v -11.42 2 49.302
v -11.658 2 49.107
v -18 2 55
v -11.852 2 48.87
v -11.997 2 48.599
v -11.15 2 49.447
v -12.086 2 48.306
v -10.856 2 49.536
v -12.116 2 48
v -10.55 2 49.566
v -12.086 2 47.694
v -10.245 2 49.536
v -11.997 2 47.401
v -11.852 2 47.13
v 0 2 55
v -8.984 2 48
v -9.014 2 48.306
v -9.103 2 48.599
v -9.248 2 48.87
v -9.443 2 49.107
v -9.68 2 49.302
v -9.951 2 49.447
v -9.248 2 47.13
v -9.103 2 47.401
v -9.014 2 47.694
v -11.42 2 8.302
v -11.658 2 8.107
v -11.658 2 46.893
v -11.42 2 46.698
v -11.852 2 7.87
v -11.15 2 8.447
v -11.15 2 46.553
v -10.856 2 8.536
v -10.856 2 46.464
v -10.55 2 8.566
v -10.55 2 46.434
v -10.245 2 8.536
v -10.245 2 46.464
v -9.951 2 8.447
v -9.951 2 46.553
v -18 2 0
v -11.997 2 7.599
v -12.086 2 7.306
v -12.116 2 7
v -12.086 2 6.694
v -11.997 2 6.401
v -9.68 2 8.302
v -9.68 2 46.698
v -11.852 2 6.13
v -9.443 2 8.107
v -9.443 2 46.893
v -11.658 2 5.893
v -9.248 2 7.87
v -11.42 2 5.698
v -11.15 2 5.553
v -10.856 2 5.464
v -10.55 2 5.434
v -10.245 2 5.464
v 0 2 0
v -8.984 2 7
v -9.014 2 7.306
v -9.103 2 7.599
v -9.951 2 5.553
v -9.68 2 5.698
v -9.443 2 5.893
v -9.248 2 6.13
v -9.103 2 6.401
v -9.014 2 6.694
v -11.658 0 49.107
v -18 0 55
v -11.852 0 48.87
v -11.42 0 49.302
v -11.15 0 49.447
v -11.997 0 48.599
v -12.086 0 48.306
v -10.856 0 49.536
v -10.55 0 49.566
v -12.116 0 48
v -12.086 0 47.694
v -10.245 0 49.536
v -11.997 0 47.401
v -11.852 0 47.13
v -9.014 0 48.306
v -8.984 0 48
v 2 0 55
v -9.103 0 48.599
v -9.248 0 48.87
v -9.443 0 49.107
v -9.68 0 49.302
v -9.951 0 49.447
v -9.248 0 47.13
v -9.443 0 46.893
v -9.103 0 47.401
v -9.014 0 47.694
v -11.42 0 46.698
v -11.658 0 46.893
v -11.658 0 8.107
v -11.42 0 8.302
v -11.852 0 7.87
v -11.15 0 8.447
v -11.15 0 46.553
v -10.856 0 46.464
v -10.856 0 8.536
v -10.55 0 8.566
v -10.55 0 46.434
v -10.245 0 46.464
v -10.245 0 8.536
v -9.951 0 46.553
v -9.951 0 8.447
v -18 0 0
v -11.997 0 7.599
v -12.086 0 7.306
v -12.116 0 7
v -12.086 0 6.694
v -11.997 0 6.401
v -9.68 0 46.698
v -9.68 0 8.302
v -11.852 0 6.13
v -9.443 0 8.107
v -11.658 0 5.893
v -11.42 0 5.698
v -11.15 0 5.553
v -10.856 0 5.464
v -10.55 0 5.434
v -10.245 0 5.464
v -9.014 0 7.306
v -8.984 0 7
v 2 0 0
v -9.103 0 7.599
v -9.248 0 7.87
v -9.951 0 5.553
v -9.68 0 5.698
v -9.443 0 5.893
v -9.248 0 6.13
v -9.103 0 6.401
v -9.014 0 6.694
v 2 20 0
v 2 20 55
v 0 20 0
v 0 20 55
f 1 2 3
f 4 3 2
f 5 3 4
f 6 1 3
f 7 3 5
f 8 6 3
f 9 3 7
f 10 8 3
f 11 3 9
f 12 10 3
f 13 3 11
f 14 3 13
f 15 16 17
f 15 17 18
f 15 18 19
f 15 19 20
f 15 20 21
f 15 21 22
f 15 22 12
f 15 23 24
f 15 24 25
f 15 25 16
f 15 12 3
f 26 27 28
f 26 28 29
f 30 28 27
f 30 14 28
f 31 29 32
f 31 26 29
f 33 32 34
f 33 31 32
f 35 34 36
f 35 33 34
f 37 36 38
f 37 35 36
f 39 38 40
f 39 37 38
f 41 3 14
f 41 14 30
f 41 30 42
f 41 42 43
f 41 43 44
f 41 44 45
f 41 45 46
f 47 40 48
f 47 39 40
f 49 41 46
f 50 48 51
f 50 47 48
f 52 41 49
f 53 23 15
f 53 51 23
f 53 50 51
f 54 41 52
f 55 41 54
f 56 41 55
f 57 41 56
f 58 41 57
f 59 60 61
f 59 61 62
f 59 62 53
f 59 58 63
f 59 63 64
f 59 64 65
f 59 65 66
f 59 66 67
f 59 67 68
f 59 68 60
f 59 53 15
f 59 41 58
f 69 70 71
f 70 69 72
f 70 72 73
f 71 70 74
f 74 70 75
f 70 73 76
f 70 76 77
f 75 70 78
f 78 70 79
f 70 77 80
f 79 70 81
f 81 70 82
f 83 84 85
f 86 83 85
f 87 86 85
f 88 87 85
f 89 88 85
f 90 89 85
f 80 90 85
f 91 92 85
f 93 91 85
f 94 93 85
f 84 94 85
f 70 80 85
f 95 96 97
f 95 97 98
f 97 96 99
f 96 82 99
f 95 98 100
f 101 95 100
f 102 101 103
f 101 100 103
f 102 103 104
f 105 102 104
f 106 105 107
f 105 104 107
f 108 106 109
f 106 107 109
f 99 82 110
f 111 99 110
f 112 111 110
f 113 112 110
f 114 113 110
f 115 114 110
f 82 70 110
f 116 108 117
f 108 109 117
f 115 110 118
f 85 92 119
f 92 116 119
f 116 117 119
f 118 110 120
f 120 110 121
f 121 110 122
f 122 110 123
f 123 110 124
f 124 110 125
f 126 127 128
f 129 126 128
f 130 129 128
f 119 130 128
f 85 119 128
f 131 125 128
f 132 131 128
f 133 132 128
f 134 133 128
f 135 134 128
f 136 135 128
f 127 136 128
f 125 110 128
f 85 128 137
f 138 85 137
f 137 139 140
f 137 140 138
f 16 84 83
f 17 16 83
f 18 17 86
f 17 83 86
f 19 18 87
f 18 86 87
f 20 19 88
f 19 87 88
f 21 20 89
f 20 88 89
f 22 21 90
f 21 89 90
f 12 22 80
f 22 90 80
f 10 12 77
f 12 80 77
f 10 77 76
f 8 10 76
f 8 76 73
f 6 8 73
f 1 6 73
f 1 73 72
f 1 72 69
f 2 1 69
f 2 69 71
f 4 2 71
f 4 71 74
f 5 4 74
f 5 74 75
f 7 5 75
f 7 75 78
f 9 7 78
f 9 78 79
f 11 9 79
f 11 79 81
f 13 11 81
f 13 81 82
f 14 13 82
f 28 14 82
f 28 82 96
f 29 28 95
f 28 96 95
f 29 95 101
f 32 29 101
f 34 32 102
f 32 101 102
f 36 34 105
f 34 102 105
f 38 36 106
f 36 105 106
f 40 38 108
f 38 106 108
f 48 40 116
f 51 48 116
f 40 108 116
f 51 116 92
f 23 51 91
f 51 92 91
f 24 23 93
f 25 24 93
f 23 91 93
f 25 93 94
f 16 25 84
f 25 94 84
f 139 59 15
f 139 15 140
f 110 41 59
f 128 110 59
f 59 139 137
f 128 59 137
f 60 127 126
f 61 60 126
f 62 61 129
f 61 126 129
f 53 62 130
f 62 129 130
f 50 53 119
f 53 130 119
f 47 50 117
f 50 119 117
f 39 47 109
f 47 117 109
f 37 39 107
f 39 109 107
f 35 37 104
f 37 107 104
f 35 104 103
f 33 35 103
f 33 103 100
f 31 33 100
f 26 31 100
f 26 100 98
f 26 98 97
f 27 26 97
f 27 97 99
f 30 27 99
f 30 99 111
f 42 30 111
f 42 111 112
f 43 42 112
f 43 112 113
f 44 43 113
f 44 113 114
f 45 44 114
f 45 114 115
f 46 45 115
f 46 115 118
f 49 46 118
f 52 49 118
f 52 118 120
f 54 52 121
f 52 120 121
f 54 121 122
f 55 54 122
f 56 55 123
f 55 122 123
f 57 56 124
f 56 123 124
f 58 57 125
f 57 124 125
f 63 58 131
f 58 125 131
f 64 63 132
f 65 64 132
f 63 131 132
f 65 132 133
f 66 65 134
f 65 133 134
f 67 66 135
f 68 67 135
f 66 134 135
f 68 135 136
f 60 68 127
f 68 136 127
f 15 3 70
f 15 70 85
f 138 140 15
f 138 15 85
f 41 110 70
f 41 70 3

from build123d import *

# Parameters (mm, degrees)
SKETCH_1_W          = 18
SKETCH_1_H          = 2
SKETCH_1_W_2        = 2
SKETCH_1_H_2        = 20
EXTRUDE_1_DEPTH     = 55
SKETCH_2_R          = 1.566180025
CUT_EXTRUDE_1_DEPTH = 10


with BuildPart() as part:
    # Эскиз1 → Бобышка-Вытянуть1 (new body)
    with BuildSketch(Plane.XY):
        with Locations((-9, 1)):
            Rectangle(SKETCH_1_W, SKETCH_1_H)
        with Locations((1, 10)):
            Rectangle(SKETCH_1_W_2, SKETCH_1_H_2)
    extrude(amount=EXTRUDE_1_DEPTH)

    # Эскиз2 → Вырез-Вытянуть1 (cut)
    with BuildSketch(Plane.XZ):
        with Locations((-10.550157234, 7)):
            Circle(SKETCH_2_R)
        with Locations((-10.550157234, 48)):
            Circle(SKETCH_2_R)
    extrude(amount=-CUT_EXTRUDE_1_DEPTH, mode=Mode.SUBTRACT)


solid = part.part
